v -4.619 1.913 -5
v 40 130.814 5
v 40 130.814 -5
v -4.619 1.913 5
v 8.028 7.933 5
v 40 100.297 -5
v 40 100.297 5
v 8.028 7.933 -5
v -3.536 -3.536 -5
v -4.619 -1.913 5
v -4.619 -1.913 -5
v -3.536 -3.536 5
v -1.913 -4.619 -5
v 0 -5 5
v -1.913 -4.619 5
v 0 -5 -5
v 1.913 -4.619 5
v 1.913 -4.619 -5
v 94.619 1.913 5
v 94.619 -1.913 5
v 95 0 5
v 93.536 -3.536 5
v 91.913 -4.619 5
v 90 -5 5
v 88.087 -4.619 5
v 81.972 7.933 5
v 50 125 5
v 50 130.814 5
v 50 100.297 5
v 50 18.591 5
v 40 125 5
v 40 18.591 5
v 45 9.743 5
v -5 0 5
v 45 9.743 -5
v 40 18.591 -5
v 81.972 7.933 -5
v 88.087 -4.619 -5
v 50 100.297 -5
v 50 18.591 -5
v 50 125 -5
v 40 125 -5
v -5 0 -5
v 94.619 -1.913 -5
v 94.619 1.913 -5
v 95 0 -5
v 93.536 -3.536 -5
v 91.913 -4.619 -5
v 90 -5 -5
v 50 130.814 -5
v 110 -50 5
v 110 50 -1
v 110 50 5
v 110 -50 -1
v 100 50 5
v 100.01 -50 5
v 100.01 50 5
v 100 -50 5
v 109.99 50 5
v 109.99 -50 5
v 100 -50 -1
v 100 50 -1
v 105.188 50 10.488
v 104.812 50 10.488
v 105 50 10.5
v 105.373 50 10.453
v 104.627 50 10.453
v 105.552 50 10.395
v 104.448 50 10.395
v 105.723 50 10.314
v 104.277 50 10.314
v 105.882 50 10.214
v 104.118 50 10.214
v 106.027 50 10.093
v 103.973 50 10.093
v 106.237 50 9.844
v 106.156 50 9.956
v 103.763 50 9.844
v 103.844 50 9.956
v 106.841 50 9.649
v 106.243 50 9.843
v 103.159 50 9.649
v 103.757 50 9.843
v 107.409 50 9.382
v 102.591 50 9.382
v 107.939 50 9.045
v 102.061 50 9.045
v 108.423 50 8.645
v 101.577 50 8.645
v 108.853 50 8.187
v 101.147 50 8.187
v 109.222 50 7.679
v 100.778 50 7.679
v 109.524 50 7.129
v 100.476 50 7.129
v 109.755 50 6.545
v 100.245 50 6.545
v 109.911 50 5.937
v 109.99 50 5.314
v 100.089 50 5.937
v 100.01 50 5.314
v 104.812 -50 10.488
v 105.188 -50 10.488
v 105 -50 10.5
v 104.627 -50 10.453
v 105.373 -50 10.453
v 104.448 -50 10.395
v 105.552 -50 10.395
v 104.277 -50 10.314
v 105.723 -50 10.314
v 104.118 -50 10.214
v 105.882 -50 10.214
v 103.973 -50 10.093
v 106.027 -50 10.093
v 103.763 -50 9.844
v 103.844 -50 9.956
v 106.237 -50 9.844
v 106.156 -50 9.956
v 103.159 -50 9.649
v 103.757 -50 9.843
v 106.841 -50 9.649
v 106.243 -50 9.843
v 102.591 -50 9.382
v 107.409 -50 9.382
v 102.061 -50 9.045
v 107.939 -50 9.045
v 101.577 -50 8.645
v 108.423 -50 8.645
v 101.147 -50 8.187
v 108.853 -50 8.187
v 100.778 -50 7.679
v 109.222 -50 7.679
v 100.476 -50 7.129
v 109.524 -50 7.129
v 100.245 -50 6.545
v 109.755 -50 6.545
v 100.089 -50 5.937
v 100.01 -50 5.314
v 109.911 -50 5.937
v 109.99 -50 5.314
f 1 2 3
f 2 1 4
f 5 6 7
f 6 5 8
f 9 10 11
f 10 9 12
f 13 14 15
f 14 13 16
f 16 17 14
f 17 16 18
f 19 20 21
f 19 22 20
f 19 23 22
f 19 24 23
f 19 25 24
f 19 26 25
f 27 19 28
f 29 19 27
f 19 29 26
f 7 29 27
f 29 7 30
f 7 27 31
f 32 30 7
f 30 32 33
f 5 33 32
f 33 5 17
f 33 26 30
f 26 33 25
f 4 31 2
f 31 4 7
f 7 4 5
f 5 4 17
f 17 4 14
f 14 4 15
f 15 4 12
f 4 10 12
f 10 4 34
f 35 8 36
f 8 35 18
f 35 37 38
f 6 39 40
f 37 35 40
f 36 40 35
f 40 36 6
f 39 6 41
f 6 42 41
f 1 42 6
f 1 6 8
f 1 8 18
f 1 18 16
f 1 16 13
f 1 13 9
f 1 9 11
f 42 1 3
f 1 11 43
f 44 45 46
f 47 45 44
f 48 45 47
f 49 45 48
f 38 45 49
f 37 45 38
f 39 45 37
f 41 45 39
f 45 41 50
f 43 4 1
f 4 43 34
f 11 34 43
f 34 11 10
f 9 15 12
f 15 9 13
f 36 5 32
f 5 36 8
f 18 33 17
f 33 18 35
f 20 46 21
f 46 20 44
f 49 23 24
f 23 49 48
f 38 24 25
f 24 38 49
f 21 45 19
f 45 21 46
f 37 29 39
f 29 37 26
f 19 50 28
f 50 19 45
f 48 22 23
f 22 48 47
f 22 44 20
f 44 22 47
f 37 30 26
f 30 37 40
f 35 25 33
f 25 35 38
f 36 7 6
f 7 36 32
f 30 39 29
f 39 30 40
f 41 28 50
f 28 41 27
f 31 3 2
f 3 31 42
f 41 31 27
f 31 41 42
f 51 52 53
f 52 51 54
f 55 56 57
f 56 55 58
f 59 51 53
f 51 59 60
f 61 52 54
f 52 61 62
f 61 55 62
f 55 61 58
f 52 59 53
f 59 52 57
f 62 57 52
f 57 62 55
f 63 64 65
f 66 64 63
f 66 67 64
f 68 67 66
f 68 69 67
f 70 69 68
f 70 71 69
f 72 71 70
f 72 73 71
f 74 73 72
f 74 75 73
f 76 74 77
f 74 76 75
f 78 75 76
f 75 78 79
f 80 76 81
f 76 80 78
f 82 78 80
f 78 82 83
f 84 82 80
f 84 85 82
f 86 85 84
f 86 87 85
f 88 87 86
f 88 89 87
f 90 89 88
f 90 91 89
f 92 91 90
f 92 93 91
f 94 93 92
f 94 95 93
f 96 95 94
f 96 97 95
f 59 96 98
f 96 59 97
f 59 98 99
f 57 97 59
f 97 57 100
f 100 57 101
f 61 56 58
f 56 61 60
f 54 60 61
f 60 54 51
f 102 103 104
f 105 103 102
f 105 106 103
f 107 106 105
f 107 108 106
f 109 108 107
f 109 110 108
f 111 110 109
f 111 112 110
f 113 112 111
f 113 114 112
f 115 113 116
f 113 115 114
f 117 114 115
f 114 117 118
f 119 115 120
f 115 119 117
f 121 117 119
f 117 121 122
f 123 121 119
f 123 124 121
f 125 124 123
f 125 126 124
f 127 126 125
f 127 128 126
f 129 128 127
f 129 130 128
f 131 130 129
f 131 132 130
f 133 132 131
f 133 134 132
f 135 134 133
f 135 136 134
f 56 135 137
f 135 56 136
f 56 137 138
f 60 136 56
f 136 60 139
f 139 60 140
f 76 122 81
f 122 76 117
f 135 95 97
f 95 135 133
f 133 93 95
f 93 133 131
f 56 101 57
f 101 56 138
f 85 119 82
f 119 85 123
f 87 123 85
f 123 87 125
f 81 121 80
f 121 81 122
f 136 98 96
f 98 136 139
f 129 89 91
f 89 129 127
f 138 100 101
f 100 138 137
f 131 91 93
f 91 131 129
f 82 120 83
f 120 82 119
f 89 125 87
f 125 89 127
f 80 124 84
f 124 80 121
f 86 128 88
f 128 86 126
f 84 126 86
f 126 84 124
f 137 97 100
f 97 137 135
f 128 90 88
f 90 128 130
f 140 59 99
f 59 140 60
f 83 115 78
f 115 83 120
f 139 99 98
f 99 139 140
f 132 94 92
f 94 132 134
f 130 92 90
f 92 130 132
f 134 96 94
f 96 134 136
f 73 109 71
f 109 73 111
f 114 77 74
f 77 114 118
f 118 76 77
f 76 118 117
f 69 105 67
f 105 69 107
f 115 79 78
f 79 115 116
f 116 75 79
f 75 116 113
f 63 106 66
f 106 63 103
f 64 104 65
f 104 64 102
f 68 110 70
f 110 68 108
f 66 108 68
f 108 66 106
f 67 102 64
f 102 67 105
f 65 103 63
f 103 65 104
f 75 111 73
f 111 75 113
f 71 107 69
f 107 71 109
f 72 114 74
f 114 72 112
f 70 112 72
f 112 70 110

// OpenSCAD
/**
 *    spool holder v1
 * 
 *    @author    Karel Fiala
 *    @email    fiala.karel@gmail.com
 *
 *    inspired by http://www.thingiverse.com/thing:296971
 */

//$fn=50;

// parameters to change
true_width=100;
true_height=140;
thick=10;
corner_radius=10;

// other parameters
height=true_height - corner_radius;
width=true_width - corner_radius;
bottom_center_y=15;
center_x=width/2;

module cyl1() {
    cylinder(d=corner_radius, h=thick, center=true);
}

module spool_base() {
    hull() {
        translate([0,0,0]) cyl1();
        translate([center_x,height,0]) cyl1();
    }

    hull() {
        translate([0,0,0]) cyl1();
        translate([center_x,bottom_center_y,0]) cyl1();
    }

    hull() {
        translate([center_x,height,0]) cyl1();
        translate([width,0,0]) cyl1();
    }

    hull() {
        translate([width,0,0]) cyl1();
        translate([center_x,bottom_center_y,0]) cyl1();
    }

    hull() {
        translate([center_x,height,0]) cyl1();
        translate([center_x,bottom_center_y,0]) cyl1();
    }    
}

module spool_bar() {
    $fn=50;
    translate([0, 0, 2])
        cube([10, 100, 6], center=true);
    
    translate([0, 0, 5])
        rotate([0, 90, 90])
            cylinder(d=10, h=100, center=true);
    
    translate([0, 0, 9])
        rotate([0, 90, 90])
            cylinder(d=3, h=100, center=true);
}

module spool_holder() {

    difference() {
        spool_base();
        
        #translate([center_x, height, 0])
            cube([10, 10, thick], center=true);
        /*
        hull() {
        #translate([center_x, height, 0])
            cylinder(d=10, h=thick, center=true);
        #translate([center_x, height - 5, 0])
            cylinder(d=10, h=thick, center=true);
        }*/
    }
    
    translate([true_width + 5, 0, 0])
        spool_bar();
}


// calling
spool_holder();
